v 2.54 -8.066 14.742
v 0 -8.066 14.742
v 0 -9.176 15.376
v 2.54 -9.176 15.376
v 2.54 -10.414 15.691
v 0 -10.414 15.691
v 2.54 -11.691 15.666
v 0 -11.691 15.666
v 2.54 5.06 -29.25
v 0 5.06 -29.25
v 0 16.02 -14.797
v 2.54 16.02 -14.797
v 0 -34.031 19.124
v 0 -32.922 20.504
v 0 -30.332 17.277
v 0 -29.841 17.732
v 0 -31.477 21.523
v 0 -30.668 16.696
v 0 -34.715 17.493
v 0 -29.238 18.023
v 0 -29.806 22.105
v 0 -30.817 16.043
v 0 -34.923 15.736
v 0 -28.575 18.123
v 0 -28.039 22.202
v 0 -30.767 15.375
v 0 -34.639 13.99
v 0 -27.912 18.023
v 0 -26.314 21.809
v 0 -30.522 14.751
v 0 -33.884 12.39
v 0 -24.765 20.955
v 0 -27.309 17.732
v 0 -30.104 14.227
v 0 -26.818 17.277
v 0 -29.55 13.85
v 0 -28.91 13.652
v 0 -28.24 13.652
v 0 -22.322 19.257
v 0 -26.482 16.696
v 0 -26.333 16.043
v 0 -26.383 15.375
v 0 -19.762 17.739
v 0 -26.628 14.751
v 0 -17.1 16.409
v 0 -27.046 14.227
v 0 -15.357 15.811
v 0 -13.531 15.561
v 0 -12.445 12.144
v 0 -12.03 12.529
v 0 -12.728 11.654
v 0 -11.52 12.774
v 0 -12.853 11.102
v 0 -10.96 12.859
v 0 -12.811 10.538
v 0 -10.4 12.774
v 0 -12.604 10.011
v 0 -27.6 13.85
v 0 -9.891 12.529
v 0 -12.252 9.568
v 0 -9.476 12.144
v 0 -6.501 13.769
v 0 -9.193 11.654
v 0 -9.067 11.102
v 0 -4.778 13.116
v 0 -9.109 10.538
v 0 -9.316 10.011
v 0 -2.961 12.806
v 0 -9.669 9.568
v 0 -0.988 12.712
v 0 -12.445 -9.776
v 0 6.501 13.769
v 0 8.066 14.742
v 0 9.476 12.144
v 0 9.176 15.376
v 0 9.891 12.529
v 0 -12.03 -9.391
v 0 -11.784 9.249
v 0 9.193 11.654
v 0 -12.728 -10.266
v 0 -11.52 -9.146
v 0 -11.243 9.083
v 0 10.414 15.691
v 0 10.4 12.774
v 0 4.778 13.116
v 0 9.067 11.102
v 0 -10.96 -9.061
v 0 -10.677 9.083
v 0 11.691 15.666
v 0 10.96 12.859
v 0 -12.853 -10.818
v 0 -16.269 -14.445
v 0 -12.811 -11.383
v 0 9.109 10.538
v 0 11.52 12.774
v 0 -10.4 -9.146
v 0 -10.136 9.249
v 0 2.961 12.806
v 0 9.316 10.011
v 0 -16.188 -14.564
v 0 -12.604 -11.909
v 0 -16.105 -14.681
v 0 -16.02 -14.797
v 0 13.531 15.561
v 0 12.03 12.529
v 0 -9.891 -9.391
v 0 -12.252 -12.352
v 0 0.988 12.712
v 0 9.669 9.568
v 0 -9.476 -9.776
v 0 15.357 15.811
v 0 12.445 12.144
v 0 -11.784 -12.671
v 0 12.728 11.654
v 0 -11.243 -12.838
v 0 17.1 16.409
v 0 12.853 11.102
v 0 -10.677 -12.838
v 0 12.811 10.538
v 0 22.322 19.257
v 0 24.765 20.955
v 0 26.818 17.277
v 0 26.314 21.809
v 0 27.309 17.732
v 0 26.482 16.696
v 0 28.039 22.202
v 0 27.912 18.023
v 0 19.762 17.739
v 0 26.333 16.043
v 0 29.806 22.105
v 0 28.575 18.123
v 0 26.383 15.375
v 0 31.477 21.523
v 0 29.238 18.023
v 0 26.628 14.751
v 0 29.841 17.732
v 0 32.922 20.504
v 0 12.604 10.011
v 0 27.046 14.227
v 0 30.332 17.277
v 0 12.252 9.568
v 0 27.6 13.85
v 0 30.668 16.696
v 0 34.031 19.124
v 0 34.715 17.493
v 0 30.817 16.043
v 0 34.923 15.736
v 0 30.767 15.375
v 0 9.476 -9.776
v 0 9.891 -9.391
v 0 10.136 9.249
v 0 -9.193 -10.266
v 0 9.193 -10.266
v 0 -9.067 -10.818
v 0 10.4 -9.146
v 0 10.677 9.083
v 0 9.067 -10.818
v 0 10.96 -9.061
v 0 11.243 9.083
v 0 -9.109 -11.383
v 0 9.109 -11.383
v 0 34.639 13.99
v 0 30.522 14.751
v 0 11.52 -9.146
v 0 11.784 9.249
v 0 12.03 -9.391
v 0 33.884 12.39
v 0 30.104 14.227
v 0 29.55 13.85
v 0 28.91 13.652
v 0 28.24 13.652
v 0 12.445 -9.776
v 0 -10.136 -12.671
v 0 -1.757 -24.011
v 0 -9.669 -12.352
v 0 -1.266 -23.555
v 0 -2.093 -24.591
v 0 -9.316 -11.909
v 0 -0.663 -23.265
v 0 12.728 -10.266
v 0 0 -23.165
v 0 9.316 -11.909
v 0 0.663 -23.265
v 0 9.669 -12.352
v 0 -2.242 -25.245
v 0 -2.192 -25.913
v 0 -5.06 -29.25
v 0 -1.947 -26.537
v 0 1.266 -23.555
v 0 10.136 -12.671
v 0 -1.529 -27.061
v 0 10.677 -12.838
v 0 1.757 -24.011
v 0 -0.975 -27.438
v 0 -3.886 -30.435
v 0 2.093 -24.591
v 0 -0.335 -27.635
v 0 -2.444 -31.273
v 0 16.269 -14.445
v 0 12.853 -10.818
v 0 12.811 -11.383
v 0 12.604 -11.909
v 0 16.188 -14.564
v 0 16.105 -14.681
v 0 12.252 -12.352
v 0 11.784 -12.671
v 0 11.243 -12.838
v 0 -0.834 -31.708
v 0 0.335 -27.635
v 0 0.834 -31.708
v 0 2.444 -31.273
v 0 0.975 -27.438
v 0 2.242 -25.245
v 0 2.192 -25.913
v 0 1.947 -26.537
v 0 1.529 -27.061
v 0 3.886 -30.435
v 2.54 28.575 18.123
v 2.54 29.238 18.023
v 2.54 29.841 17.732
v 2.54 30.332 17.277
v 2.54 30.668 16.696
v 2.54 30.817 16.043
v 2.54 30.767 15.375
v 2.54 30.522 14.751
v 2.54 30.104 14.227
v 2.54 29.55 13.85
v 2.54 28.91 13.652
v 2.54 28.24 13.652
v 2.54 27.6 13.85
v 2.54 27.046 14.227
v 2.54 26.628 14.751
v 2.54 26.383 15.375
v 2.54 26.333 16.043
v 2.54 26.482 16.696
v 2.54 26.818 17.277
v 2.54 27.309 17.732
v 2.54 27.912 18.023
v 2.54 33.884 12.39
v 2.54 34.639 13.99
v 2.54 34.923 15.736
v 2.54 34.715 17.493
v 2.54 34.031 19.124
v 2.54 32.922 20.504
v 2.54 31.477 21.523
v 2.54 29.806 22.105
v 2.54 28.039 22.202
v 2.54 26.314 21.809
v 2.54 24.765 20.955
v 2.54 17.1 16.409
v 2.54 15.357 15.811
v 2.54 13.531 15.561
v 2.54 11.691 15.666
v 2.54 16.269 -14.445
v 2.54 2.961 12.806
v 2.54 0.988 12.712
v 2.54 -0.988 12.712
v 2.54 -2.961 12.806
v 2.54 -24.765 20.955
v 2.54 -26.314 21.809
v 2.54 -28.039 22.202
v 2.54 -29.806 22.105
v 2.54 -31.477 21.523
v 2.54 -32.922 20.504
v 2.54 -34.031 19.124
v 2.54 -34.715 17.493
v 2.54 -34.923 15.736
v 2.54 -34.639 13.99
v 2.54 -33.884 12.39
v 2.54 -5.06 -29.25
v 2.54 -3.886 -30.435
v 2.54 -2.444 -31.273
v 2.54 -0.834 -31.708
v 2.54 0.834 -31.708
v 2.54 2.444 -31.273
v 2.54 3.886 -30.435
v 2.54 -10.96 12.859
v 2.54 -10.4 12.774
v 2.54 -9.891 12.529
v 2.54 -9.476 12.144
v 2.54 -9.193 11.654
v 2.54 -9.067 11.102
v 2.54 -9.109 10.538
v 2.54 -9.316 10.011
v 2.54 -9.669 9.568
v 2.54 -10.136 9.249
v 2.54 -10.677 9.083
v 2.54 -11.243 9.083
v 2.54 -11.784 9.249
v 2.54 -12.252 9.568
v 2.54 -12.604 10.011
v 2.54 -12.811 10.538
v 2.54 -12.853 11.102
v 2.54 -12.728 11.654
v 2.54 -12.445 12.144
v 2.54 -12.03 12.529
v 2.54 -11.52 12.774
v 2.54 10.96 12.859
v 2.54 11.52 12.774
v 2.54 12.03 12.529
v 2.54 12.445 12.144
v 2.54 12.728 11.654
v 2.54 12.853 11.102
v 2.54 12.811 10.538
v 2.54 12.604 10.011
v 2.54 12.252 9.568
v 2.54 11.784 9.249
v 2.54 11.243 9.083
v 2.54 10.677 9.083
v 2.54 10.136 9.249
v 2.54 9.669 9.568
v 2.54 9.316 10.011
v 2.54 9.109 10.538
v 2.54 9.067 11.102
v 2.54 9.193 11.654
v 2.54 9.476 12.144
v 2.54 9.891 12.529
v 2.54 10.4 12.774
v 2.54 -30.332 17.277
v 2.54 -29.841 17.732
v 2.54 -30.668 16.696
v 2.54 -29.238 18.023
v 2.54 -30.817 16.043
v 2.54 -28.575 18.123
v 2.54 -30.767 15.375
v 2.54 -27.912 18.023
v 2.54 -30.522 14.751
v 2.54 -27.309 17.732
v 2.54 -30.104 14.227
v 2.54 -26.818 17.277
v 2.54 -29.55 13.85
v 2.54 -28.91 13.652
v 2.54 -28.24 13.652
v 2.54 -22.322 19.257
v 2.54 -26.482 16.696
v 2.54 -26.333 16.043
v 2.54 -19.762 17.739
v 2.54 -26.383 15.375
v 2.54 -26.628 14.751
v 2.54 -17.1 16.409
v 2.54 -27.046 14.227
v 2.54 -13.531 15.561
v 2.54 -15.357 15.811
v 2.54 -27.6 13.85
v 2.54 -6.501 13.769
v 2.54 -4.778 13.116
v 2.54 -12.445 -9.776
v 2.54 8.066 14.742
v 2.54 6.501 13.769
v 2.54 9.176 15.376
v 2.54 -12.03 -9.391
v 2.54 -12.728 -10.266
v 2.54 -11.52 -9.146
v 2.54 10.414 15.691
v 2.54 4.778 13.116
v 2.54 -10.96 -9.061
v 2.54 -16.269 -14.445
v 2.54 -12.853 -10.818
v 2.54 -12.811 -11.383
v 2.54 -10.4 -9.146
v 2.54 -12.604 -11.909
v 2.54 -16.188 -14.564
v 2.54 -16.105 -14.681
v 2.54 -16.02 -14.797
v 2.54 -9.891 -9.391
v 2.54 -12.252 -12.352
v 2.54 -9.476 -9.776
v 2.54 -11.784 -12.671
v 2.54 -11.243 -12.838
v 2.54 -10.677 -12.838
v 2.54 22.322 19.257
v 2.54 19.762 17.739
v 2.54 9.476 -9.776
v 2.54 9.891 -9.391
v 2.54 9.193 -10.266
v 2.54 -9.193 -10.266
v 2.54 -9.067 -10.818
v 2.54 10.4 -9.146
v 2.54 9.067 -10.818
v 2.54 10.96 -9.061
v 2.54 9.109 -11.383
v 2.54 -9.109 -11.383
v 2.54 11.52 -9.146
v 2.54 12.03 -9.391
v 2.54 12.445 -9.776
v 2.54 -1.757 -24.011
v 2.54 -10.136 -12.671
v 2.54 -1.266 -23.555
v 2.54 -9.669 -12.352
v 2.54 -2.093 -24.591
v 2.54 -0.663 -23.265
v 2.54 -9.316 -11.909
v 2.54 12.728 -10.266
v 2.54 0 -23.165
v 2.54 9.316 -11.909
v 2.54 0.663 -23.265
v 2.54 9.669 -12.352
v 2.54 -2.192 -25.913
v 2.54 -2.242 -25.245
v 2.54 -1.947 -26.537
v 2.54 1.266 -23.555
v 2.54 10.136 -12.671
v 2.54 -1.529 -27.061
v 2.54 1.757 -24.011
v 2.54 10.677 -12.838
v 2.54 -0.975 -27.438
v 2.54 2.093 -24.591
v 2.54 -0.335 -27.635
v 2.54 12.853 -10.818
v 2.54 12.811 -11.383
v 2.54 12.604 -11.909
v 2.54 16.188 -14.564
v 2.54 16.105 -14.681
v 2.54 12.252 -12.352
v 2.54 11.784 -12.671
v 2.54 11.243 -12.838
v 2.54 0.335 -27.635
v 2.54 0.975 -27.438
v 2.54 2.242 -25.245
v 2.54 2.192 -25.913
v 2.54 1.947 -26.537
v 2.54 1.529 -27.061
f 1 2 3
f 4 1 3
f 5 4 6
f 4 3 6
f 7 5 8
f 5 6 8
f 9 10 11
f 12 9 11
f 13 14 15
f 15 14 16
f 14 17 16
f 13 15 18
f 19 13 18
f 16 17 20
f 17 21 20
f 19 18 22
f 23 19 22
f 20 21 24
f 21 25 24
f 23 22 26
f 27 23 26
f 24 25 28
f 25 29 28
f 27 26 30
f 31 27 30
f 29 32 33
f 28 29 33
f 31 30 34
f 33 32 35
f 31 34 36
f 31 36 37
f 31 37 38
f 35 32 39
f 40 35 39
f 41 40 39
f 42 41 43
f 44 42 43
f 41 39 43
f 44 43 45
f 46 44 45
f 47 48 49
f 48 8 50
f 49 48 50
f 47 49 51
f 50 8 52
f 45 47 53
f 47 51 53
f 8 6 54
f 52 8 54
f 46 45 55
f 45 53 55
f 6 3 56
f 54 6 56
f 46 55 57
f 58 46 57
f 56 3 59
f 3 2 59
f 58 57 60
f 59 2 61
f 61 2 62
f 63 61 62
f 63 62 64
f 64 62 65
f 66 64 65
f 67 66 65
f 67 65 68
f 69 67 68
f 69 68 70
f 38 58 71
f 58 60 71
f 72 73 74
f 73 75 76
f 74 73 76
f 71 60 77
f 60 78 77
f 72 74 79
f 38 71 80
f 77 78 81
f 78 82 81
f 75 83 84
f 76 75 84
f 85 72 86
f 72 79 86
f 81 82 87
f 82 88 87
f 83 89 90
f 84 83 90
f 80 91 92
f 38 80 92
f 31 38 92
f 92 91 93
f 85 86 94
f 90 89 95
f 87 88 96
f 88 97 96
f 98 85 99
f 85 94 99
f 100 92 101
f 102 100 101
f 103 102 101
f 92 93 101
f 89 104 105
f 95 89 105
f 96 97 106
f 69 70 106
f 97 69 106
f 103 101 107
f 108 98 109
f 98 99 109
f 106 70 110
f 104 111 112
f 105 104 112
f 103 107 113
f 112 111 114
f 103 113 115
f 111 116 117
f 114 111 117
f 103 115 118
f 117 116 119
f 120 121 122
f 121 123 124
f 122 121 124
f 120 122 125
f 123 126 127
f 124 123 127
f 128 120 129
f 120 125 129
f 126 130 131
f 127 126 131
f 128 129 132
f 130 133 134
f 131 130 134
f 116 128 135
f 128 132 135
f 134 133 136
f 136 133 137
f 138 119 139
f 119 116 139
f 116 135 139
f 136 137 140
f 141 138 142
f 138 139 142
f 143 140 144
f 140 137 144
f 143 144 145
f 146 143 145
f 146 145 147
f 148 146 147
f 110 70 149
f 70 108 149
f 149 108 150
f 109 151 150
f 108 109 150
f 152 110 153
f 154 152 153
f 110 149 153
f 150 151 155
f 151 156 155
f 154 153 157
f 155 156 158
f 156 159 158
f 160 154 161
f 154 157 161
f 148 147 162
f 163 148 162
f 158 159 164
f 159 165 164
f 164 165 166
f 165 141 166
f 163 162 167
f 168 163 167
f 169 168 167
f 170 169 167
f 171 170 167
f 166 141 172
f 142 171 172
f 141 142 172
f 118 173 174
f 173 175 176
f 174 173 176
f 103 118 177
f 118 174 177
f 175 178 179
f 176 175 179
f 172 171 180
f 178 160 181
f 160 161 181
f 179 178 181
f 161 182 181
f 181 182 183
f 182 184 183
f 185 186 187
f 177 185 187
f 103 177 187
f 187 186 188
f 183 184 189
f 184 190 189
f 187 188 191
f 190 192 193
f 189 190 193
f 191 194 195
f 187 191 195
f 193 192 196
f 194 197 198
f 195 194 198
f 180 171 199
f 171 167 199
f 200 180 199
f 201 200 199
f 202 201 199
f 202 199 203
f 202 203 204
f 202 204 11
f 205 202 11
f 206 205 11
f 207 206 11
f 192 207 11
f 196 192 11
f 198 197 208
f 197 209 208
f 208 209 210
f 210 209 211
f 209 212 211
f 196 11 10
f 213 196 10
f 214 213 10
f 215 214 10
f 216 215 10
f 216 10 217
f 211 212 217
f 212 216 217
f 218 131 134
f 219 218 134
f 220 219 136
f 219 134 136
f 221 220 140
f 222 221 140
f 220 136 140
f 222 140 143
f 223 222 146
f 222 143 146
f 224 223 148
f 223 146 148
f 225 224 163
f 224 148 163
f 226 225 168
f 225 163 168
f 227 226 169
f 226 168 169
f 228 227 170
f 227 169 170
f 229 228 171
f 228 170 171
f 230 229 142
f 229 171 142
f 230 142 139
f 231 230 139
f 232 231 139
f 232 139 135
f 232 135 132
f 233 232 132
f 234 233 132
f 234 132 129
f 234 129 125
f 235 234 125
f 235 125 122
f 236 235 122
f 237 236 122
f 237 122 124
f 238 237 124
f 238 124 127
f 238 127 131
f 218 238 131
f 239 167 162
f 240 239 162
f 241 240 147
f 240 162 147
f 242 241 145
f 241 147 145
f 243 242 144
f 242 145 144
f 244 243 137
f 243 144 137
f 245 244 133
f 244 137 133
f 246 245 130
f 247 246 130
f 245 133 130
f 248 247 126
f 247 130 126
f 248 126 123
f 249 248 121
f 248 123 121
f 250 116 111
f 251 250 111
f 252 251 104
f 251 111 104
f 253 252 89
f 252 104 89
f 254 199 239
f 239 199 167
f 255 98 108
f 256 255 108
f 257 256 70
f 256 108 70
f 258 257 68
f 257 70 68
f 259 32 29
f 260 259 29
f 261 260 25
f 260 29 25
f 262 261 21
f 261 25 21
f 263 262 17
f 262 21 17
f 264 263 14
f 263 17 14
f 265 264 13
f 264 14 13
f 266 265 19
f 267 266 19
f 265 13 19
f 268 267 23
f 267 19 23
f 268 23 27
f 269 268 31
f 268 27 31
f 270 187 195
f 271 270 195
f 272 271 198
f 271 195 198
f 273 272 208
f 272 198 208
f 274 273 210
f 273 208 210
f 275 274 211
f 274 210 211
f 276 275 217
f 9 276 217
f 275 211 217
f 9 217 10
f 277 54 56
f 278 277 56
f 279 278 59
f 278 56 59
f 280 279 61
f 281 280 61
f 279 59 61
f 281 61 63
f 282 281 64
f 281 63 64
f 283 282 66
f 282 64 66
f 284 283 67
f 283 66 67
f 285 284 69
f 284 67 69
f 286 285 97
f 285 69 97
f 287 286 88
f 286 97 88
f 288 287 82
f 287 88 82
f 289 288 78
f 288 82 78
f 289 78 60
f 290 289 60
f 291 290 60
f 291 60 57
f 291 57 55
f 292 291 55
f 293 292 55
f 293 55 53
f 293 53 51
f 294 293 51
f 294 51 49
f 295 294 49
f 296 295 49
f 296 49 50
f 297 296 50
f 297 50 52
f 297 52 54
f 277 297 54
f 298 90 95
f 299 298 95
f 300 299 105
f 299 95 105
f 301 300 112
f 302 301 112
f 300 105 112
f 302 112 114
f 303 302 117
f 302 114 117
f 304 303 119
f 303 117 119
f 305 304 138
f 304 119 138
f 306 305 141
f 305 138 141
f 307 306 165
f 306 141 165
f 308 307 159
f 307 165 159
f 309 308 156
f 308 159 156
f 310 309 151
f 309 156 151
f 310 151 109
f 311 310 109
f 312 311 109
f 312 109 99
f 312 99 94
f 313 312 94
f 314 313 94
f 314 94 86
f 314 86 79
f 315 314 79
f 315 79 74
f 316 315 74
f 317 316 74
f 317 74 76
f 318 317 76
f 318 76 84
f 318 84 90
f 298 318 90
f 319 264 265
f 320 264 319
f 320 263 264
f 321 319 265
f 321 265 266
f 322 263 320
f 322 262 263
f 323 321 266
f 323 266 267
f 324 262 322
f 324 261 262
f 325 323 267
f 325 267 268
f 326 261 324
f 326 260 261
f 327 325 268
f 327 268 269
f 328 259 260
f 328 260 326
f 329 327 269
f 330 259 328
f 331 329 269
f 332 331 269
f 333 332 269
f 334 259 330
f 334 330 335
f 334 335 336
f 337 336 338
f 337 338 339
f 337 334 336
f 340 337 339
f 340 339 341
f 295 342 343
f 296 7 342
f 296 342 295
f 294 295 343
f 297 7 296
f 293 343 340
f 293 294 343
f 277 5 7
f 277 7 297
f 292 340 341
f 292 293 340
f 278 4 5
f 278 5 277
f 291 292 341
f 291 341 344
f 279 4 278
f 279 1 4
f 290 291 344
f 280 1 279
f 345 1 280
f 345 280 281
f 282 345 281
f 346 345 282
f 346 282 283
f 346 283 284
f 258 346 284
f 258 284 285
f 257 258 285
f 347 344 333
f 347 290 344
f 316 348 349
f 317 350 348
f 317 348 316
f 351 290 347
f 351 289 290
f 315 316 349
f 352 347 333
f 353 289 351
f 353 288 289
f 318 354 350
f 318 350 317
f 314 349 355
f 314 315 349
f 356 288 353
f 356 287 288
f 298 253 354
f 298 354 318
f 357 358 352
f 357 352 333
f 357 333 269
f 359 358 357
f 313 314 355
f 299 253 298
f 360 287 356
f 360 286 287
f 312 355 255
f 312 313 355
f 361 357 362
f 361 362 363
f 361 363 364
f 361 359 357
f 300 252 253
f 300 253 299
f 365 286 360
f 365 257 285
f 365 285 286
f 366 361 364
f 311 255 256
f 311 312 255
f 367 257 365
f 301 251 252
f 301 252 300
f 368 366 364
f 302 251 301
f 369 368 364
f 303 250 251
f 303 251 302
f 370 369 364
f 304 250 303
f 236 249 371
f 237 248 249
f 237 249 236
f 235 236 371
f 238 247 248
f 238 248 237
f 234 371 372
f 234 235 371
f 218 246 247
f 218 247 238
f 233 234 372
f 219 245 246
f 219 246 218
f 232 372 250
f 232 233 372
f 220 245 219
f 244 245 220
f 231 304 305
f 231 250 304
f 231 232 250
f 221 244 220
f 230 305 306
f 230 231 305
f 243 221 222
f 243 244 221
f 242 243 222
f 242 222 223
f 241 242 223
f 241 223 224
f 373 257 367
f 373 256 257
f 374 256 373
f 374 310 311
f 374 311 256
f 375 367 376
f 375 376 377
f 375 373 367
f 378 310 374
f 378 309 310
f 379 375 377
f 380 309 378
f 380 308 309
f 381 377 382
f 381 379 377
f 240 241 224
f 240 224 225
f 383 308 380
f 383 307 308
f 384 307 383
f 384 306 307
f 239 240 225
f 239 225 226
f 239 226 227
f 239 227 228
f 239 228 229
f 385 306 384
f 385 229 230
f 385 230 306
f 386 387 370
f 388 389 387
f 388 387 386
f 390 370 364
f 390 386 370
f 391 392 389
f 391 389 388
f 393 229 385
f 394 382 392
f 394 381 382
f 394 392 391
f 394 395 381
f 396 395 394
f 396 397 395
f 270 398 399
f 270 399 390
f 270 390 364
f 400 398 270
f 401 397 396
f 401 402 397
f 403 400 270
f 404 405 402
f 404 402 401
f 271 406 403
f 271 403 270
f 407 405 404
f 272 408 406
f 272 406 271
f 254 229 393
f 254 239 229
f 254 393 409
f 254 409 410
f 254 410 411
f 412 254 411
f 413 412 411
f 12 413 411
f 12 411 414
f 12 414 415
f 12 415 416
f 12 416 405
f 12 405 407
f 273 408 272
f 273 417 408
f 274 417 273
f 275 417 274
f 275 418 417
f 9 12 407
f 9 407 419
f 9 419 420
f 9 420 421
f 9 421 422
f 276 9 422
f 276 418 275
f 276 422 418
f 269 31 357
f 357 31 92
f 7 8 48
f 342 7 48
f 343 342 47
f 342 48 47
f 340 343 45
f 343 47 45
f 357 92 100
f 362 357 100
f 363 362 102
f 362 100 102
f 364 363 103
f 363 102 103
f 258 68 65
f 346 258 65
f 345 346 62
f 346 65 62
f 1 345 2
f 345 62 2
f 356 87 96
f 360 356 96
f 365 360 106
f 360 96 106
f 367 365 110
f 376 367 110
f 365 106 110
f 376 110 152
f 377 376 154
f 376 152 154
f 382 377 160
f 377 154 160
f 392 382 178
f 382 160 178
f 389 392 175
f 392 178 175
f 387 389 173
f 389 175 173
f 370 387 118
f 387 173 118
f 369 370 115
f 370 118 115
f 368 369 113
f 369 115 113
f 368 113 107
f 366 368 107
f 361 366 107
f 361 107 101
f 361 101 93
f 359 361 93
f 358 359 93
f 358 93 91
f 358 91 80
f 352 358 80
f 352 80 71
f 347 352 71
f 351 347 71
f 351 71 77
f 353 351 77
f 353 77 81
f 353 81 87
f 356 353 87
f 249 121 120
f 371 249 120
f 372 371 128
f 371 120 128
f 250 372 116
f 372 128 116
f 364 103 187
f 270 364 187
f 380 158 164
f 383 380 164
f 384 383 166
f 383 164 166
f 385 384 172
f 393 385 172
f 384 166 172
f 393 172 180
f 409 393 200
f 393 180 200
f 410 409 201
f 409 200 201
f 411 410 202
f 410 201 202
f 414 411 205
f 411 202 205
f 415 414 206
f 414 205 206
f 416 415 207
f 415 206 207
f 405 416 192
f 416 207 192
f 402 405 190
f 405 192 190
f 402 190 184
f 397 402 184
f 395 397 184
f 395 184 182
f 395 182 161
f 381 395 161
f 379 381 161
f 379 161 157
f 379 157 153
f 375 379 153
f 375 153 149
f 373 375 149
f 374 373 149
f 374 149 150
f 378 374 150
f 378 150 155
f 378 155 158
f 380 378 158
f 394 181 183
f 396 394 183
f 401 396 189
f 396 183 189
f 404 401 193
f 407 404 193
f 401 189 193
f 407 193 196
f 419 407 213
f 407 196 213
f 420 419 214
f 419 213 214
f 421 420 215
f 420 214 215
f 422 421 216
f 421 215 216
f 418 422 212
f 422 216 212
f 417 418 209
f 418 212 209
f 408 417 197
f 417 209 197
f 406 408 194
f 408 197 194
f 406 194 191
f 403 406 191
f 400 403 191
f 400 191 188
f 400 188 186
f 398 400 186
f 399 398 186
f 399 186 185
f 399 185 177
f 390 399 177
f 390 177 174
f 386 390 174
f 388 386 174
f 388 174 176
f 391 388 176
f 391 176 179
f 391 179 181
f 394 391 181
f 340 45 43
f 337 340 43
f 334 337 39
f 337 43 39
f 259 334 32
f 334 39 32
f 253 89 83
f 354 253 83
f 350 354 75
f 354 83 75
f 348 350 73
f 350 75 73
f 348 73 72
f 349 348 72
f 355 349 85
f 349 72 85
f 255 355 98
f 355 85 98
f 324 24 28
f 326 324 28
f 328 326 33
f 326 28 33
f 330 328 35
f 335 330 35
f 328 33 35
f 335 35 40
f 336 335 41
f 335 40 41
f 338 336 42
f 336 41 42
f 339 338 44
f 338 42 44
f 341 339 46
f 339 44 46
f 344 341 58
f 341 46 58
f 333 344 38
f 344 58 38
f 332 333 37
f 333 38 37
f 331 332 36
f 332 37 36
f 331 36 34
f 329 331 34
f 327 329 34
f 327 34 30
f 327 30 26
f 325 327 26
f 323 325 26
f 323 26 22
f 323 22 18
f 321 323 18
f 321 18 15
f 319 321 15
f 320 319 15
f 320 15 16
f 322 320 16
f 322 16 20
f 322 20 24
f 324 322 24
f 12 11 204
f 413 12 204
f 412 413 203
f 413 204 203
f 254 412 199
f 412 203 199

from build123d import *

# Parameters (mm, degrees)
BOSS_EXTRUDE1_DEPTH   = 2.54
F_8_CLEARANCE_HOLE1_D = 4.4958
F_6_CLEARANCE_HOLE1_D = 3.7973


with BuildPart() as part:
    # Sketch1 → Boss-Extrude1 (new body)
    with BuildSketch(Plane(origin=(0, 0, 0), x_dir=(0, 0, -1), z_dir=(1, 0, 0))):
        with BuildLine():
            Line((29.249678303, 5.059653892), (14.797078303, 16.019753892))
            ThreePointArc((14.797078303, 16.019753892), (14.622989145, 16.14717462), (14.444672021, 16.268608061))
            Line((14.444672021, 16.268608061), (-12.390427979, 33.883508061))
            ThreePointArc((-12.390427979, 33.883508061), (-20.503514332, 32.92233885), (-20.955, 24.765))
            ThreePointArc((-20.955, 24.765), (-18.474577219, 21.05577373), (-16.409060049, 17.100461415))
            ThreePointArc((-16.409060049, 17.100461415), (-15.641722595, 14.450337743), (-15.666107705, 11.691467029))
            ThreePointArc((-15.666107705, 11.691467029), (-15.575146808, 9.784196429), (-14.742333624, 8.065948127))
            ThreePointArc((-14.742333624, 8.065948127), (-13.400723388, 5.655129962), (-12.806341132, 2.960937694))
            ThreePointArc((-12.806341132, 2.960937694), (-12.7, 0), (-12.806341132, -2.960937694))
            ThreePointArc((-12.806341132, -2.960937694), (-13.400723388, -5.655129962), (-14.742333624, -8.065948127))
            ThreePointArc((-14.742333624, -8.065948127), (-15.575146808, -9.784196429), (-15.666107705, -11.691467029))
            ThreePointArc((-15.666107705, -11.691467029), (-15.641722595, -14.450337743), (-16.409060049, -17.100461415))
            ThreePointArc((-16.409060049, -17.100461415), (-18.474577219, -21.05577373), (-20.955, -24.765))
            ThreePointArc((-20.955, -24.765), (-20.503514332, -32.92233885), (-12.390427979, -33.883508061))
            Line((-12.390427979, -33.883508061), (14.444672021, -16.268608061))
            ThreePointArc((14.444672021, -16.268608061), (14.622989145, -16.14717462), (14.797078303, -16.019753892))
            Line((14.797078303, -16.019753892), (29.249678303, -5.059653892))
            ThreePointArc((29.249678303, -5.059653892), (31.7627, 0), (29.249678303, 5.059653892))
        make_face()
    extrude(amount=BOSS_EXTRUDE1_DEPTH)

    # #8 Clearance Hole1 (through all)
    with Locations(Plane(origin=(2.54, 0, 0), x_dir=(0, 0, -1), z_dir=(1, 0, 0))):
        with Locations((-15.875, 28.575), (25.4127, 0), (-15.875, -28.575)):
            Hole(F_8_CLEARANCE_HOLE1_D / 2)

    # #6 Clearance Hole1 (through all)
    with Locations(Plane(origin=(2.54, 0, 0), x_dir=(0, 0, -1), z_dir=(1, 0, 0))):
        with Locations((-10.9601, 10.9601), (10.9601, 10.9601), (-10.9601, -10.9601), (10.9601, -10.9601)):
            Hole(F_6_CLEARANCE_HOLE1_D / 2)


solid = part.part
